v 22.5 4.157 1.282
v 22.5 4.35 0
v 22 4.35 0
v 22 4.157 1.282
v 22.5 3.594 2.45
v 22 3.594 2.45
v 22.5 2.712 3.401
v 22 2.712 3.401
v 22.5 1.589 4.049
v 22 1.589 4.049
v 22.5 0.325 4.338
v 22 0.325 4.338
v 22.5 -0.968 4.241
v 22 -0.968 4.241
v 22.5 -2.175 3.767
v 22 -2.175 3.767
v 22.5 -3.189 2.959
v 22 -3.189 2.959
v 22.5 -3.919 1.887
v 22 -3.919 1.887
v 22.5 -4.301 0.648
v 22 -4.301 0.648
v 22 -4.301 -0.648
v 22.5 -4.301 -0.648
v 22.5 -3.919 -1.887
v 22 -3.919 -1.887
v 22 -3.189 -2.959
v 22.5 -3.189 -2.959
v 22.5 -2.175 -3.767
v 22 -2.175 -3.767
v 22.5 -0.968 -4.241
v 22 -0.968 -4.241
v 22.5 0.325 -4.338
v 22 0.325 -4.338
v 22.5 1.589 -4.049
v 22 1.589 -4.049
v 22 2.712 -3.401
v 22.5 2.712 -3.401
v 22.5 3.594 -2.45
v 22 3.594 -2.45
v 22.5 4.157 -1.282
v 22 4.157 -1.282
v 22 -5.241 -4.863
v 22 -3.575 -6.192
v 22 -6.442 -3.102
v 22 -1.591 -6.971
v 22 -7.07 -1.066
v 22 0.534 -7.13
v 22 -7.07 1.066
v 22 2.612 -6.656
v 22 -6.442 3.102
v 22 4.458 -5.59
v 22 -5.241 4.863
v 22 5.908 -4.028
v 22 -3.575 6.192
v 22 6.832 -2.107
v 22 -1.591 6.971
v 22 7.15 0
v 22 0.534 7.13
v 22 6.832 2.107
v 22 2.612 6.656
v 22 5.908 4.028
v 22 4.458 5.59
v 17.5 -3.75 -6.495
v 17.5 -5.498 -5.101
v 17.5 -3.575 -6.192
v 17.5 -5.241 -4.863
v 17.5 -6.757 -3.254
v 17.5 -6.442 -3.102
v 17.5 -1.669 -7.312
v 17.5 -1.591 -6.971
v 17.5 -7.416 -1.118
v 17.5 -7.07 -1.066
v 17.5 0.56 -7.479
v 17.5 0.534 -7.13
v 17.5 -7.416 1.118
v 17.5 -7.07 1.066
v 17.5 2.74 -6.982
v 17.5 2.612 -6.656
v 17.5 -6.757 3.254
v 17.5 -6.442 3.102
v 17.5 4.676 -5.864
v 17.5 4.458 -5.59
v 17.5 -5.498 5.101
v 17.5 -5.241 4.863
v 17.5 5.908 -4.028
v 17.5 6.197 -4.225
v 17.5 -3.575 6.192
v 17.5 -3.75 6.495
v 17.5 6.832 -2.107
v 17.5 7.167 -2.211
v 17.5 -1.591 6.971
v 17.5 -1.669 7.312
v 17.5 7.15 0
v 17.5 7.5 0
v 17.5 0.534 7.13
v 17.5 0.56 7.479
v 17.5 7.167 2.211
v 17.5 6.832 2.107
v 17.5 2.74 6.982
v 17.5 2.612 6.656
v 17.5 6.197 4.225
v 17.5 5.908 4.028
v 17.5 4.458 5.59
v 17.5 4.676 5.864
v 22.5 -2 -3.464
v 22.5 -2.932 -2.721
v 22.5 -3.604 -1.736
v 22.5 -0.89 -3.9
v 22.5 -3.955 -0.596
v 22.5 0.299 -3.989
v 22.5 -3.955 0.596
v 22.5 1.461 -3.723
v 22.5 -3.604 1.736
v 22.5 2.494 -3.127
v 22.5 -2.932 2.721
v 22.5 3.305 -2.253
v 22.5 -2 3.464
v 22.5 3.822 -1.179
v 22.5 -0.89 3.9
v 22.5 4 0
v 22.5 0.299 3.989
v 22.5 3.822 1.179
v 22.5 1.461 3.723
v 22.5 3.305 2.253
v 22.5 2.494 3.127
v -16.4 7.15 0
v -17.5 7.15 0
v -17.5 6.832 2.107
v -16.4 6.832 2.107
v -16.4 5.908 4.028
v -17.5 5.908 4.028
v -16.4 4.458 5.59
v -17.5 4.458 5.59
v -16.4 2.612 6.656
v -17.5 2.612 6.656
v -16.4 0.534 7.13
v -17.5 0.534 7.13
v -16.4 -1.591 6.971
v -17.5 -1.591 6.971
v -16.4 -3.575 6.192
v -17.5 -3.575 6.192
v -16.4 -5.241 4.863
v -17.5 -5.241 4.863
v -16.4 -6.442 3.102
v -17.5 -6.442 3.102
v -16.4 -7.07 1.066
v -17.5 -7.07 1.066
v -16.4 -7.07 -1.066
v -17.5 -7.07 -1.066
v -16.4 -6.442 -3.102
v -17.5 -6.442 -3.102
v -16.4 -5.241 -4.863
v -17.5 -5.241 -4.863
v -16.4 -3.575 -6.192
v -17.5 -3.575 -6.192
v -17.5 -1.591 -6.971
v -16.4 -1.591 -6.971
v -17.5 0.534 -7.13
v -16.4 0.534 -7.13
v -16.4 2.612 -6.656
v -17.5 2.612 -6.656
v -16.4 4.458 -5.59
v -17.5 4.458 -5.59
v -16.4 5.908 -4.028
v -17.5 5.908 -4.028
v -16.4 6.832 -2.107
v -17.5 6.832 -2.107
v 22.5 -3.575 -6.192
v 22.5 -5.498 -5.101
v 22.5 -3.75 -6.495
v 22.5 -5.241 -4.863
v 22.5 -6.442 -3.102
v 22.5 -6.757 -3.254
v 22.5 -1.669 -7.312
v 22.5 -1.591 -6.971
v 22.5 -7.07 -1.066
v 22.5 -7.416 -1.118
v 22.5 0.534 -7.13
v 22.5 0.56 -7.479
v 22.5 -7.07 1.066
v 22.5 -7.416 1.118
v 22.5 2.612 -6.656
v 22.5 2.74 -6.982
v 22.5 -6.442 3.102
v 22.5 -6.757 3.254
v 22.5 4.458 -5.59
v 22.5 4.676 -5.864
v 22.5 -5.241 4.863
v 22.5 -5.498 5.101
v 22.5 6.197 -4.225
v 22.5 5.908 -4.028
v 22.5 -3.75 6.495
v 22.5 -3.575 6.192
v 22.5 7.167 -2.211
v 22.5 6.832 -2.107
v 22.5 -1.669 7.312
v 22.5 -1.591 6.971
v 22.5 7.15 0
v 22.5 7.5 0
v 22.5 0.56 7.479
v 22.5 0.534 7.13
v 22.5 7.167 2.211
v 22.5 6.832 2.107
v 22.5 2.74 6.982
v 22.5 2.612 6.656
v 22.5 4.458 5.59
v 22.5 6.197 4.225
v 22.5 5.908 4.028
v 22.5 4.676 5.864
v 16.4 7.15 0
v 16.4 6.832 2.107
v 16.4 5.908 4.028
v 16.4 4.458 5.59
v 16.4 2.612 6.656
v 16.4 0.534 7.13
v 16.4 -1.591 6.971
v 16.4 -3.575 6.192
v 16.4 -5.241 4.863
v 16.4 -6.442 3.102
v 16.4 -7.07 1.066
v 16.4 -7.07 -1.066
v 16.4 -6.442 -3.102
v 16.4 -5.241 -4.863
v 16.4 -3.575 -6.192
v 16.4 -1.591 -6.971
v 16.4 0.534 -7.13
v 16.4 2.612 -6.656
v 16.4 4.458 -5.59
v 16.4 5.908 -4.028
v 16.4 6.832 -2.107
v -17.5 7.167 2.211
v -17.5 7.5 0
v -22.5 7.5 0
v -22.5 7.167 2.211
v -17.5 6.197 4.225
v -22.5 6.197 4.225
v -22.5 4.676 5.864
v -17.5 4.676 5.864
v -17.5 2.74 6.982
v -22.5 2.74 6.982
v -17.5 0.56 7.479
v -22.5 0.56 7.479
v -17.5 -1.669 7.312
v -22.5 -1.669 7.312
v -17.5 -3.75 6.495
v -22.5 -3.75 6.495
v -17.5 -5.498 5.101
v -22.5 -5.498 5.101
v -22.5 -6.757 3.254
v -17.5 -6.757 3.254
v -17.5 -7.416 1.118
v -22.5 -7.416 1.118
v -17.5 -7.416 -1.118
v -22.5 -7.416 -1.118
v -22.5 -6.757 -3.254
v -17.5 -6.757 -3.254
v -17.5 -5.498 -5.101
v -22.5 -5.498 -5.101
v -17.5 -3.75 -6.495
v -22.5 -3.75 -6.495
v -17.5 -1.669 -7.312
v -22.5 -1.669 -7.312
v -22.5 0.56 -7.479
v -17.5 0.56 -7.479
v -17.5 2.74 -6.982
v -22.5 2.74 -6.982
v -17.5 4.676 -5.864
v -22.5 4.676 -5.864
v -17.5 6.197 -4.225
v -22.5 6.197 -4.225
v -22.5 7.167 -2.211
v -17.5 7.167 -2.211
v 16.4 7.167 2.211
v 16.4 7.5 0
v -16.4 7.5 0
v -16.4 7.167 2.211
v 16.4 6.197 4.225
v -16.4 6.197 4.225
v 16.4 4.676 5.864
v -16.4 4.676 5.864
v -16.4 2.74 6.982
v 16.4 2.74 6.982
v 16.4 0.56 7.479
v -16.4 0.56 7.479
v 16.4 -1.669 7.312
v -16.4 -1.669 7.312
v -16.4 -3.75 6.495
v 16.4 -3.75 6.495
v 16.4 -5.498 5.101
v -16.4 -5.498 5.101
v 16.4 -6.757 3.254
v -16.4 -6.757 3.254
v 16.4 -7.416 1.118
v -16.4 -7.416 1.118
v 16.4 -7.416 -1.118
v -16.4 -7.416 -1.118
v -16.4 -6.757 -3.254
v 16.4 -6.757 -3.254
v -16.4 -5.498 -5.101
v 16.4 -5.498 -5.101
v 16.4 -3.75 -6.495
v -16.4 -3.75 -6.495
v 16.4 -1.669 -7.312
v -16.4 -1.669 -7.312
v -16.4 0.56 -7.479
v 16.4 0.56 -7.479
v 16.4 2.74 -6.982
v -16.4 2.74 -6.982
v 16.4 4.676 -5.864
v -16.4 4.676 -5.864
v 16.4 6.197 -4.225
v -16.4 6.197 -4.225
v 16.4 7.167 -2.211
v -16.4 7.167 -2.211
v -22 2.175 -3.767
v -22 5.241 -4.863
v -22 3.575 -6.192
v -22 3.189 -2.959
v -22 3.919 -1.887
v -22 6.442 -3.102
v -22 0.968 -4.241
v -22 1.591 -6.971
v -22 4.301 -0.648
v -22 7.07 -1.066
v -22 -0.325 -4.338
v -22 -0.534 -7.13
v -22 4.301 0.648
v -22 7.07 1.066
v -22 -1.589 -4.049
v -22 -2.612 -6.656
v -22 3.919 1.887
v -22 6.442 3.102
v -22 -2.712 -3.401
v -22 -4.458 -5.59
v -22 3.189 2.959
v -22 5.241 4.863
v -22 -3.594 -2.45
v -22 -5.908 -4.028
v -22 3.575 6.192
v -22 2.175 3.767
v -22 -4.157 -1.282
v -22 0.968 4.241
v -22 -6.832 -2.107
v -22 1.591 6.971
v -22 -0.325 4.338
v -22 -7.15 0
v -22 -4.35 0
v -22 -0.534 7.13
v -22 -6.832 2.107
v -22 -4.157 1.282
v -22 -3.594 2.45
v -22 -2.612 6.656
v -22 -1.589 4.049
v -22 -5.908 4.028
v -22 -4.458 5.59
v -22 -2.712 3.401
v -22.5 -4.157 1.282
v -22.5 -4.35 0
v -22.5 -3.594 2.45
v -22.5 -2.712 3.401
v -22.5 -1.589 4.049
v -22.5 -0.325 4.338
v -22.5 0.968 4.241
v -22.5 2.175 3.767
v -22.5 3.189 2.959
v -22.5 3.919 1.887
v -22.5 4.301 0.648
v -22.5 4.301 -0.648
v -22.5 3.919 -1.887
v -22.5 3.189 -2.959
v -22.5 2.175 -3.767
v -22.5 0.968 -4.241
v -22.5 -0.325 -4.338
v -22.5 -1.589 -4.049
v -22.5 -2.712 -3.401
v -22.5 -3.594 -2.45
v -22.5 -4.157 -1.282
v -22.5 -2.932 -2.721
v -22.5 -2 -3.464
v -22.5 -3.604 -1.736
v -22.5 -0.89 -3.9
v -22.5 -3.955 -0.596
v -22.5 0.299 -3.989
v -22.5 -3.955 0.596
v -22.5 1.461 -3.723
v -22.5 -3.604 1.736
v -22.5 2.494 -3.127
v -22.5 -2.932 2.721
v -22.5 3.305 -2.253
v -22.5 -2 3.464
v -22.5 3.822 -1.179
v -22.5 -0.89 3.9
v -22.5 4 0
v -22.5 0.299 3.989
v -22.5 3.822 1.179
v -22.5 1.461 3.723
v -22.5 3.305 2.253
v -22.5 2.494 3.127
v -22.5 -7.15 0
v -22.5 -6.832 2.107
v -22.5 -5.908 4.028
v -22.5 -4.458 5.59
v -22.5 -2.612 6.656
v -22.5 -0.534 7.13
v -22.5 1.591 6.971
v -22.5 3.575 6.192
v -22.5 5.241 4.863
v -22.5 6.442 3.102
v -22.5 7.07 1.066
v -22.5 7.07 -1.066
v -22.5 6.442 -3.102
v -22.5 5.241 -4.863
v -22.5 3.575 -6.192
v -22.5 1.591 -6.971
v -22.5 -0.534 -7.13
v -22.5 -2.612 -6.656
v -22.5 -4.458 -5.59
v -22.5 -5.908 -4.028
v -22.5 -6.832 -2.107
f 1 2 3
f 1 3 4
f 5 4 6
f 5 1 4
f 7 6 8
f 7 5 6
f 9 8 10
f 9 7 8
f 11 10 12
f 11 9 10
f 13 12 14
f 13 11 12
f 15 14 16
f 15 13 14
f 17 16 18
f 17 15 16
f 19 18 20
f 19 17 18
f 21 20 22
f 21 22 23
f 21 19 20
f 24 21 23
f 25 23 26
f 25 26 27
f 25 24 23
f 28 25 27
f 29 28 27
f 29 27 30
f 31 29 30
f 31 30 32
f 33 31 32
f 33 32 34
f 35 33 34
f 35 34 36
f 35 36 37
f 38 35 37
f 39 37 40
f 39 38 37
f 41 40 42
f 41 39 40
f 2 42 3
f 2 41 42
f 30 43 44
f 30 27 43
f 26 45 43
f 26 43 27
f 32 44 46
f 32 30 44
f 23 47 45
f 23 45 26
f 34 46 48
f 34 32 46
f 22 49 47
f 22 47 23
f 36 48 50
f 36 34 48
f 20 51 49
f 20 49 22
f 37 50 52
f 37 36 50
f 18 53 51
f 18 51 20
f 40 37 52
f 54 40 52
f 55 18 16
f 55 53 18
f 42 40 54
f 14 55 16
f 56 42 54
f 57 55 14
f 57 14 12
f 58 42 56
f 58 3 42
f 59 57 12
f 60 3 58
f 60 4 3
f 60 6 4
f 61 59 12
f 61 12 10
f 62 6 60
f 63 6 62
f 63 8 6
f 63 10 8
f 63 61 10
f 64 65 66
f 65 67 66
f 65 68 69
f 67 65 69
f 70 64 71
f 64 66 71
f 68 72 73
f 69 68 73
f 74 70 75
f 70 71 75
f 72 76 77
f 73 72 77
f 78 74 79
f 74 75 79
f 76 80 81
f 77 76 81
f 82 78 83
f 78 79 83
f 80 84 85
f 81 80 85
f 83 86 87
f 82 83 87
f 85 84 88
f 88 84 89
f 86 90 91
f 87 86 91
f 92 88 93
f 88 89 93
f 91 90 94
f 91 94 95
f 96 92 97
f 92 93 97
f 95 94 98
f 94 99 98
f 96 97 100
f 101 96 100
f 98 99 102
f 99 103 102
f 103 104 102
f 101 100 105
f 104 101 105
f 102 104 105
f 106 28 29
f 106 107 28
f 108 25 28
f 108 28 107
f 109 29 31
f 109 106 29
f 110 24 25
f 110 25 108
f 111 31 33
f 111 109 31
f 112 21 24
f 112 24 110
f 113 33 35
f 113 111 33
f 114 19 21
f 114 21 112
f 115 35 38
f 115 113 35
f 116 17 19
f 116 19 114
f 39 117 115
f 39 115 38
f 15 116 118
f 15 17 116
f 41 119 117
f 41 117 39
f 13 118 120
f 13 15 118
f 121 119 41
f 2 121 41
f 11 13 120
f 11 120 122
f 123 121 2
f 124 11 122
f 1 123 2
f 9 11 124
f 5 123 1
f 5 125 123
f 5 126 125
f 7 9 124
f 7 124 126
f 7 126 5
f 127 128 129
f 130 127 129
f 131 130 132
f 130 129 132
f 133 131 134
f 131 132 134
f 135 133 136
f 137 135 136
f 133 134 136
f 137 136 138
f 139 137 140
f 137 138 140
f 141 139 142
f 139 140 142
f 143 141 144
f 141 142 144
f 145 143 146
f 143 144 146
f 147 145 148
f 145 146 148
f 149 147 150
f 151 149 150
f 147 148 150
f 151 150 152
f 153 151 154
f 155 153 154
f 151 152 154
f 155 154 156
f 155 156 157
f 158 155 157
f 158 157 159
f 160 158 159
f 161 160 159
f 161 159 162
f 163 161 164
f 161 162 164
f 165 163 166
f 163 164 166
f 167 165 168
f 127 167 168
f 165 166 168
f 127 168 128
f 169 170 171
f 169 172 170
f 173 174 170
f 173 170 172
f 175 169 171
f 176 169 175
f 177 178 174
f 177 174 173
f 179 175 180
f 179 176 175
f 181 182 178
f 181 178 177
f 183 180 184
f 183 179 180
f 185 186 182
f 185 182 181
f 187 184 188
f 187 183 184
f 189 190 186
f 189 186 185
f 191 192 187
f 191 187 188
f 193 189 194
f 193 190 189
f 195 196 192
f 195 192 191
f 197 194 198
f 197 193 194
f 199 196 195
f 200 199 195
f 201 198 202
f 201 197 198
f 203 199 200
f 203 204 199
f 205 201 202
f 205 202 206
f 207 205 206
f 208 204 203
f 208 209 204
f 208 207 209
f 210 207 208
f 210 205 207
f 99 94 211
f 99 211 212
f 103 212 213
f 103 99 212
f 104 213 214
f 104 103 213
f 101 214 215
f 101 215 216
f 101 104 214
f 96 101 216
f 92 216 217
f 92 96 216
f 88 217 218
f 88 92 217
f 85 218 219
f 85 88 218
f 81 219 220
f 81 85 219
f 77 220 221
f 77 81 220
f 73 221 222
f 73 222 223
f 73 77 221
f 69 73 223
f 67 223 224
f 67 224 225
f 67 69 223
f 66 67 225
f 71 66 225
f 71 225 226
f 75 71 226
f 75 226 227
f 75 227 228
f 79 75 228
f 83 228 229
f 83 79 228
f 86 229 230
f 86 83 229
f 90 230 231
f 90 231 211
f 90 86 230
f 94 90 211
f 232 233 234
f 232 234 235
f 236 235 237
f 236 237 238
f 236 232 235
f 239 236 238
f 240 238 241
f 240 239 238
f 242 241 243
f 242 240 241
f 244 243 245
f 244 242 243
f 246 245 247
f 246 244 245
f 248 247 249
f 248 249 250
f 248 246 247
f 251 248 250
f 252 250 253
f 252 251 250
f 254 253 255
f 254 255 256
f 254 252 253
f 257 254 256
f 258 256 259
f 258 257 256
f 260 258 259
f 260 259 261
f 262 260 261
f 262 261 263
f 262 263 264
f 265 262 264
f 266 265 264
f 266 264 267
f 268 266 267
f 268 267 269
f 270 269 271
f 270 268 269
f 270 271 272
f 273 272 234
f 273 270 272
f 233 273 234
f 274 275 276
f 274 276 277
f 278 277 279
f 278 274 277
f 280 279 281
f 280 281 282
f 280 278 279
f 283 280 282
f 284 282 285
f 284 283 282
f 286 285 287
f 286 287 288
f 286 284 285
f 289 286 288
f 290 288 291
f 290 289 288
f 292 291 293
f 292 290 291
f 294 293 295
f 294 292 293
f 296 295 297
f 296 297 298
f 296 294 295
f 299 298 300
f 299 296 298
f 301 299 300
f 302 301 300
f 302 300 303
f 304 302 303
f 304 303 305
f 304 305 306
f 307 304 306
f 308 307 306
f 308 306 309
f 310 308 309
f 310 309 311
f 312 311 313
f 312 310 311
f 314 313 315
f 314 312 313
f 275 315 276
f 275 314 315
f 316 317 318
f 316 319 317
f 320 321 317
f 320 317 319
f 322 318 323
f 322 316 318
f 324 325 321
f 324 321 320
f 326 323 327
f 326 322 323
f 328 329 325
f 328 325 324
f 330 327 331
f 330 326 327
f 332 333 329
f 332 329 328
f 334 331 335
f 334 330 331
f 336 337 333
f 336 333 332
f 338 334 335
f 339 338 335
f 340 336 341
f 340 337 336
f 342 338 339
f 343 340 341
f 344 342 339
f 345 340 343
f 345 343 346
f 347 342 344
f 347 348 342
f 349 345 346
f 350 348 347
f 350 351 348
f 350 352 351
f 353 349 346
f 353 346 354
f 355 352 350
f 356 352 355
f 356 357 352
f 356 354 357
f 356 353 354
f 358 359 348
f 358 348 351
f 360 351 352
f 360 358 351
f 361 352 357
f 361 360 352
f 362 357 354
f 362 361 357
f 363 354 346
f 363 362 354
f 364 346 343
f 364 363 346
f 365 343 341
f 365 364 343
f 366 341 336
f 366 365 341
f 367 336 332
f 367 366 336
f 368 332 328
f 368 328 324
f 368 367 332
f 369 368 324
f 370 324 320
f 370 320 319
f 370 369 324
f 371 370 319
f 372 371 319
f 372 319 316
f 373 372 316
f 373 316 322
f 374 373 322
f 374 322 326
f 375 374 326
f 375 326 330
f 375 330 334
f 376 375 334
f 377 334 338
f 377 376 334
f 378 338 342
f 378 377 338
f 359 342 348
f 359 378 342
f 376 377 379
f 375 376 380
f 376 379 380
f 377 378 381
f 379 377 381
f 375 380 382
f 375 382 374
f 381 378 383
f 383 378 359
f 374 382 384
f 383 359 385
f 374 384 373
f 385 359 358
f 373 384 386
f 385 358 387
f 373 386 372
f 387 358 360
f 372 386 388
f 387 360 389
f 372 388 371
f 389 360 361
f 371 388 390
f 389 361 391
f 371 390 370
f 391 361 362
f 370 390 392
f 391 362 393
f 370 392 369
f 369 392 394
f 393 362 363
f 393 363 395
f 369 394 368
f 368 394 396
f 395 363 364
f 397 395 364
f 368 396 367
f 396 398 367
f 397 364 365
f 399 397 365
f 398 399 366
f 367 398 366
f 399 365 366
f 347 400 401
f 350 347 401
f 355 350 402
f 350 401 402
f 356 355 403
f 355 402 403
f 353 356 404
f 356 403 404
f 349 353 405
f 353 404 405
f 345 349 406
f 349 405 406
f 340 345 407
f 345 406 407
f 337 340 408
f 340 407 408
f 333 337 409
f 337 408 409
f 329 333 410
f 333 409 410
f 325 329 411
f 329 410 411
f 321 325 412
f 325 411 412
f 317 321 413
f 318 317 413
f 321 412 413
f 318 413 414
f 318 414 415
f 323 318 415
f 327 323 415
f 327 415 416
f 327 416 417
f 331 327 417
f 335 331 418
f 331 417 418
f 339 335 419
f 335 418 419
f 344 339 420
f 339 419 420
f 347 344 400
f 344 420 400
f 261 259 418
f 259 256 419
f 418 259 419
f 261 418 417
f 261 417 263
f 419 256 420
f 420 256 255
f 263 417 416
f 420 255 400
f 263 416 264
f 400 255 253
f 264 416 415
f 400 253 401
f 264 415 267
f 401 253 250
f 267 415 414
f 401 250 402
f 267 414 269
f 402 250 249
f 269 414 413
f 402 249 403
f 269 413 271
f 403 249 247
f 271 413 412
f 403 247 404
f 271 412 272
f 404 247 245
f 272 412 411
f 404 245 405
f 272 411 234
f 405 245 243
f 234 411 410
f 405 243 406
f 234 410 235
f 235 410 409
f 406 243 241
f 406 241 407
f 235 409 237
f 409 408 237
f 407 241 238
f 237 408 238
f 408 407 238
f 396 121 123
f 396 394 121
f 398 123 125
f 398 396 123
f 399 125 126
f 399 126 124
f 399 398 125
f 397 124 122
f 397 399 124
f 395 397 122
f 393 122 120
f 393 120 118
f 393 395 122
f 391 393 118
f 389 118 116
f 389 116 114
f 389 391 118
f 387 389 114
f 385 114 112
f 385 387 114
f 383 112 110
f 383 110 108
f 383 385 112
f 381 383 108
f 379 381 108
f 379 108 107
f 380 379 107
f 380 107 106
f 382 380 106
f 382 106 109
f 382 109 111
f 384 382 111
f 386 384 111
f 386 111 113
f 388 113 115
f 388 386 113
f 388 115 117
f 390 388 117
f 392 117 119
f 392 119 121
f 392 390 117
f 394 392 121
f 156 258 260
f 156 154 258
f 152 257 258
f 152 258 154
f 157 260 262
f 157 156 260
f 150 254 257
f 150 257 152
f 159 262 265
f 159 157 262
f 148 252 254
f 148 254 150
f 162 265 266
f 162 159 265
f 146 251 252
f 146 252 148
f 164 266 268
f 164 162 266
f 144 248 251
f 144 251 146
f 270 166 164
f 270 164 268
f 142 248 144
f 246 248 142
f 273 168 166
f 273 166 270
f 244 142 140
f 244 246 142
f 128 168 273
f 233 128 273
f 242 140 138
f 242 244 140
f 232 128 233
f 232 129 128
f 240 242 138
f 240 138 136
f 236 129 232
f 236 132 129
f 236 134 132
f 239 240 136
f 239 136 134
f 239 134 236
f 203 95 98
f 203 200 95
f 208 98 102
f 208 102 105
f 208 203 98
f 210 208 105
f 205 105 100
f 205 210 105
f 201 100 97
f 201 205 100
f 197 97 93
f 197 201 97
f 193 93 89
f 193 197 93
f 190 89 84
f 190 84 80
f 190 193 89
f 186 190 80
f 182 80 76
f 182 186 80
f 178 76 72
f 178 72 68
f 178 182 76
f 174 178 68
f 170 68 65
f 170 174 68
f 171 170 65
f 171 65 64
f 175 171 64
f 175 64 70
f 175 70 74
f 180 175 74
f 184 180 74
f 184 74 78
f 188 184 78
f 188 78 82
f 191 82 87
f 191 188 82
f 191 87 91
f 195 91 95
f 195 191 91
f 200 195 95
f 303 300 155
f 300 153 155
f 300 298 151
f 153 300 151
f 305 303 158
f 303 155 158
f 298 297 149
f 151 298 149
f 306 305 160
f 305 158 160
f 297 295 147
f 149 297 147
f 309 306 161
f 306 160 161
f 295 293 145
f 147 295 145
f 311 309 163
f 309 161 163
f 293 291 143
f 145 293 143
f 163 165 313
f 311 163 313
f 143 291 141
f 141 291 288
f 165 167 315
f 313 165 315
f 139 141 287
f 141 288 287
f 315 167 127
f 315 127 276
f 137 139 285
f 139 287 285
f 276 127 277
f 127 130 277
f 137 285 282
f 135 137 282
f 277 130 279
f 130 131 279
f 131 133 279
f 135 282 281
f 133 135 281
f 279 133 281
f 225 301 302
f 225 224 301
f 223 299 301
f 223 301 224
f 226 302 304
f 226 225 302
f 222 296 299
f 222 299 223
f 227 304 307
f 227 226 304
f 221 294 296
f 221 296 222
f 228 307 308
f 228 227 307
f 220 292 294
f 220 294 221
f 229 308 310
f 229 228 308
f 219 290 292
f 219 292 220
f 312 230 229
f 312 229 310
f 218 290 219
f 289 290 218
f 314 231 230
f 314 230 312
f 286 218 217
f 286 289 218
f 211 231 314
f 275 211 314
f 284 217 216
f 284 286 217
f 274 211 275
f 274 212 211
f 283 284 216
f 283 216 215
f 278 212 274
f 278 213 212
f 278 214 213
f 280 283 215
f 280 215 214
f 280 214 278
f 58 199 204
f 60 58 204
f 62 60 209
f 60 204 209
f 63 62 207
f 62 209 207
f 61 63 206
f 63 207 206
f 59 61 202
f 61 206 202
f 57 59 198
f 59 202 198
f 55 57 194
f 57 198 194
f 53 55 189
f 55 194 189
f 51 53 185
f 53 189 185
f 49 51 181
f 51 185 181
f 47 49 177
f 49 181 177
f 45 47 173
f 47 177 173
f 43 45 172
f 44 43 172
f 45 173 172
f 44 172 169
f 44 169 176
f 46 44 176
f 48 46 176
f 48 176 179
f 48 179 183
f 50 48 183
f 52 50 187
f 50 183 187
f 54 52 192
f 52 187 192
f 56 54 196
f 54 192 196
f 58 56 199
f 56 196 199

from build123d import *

# Parameters (mm, degrees)
F0_R      = 7.5
F0_R_2    = 4
F1_DEPTH  = 22.5
F4_R      = 8
F4_R_2    = 7.15
F5_DEPTH  = 1.1
F6_R      = 8
F6_R_2    = 7.15
F7_DEPTH  = 1.1
F8_R      = 7.15
F8_R_2    = 4.35
F9_DEPTH  = 0.5
F11_R     = 7.15
F11_R_2   = 4.35
F12_DEPTH = 0.5


with BuildPart() as f1:
    # F0 (on Right) → F1 (new body, symmetric)
    with BuildSketch(Plane.YZ):
        Circle(F0_R)
        Circle(F0_R_2, mode=Mode.SUBTRACT)
    extrude(amount=F1_DEPTH, both=True)

    # F4 (on offset) → F5 (cut)
    with BuildSketch(Plane.YZ.offset(-17.5)):
        Circle(F4_R)
        Circle(F4_R_2, mode=Mode.SUBTRACT)
    extrude(amount=F5_DEPTH, mode=Mode.SUBTRACT)

    # F6 (on offset) → F7 (cut)
    with BuildSketch(Plane.YZ.offset(17.5)):
        Circle(F6_R)
        Circle(F6_R_2, mode=Mode.SUBTRACT)
    extrude(amount=-F7_DEPTH, mode=Mode.SUBTRACT)

    # F8 (on face) → F9 (cut)
    with BuildSketch(Plane.YZ.offset(22.5)):
        Circle(F8_R)
        Circle(F8_R_2, mode=Mode.SUBTRACT)
    extrude(amount=-F9_DEPTH, mode=Mode.SUBTRACT)

    # F11 (on face) → F12 (cut)
    with BuildSketch(Plane(origin=(-22.5, 0, 0), x_dir=(0, -1, 0), z_dir=(-1, 0, 0))):
        Circle(F11_R)
        Circle(F11_R_2, mode=Mode.SUBTRACT)
    extrude(amount=-F12_DEPTH, mode=Mode.SUBTRACT)


solid = f1.part
